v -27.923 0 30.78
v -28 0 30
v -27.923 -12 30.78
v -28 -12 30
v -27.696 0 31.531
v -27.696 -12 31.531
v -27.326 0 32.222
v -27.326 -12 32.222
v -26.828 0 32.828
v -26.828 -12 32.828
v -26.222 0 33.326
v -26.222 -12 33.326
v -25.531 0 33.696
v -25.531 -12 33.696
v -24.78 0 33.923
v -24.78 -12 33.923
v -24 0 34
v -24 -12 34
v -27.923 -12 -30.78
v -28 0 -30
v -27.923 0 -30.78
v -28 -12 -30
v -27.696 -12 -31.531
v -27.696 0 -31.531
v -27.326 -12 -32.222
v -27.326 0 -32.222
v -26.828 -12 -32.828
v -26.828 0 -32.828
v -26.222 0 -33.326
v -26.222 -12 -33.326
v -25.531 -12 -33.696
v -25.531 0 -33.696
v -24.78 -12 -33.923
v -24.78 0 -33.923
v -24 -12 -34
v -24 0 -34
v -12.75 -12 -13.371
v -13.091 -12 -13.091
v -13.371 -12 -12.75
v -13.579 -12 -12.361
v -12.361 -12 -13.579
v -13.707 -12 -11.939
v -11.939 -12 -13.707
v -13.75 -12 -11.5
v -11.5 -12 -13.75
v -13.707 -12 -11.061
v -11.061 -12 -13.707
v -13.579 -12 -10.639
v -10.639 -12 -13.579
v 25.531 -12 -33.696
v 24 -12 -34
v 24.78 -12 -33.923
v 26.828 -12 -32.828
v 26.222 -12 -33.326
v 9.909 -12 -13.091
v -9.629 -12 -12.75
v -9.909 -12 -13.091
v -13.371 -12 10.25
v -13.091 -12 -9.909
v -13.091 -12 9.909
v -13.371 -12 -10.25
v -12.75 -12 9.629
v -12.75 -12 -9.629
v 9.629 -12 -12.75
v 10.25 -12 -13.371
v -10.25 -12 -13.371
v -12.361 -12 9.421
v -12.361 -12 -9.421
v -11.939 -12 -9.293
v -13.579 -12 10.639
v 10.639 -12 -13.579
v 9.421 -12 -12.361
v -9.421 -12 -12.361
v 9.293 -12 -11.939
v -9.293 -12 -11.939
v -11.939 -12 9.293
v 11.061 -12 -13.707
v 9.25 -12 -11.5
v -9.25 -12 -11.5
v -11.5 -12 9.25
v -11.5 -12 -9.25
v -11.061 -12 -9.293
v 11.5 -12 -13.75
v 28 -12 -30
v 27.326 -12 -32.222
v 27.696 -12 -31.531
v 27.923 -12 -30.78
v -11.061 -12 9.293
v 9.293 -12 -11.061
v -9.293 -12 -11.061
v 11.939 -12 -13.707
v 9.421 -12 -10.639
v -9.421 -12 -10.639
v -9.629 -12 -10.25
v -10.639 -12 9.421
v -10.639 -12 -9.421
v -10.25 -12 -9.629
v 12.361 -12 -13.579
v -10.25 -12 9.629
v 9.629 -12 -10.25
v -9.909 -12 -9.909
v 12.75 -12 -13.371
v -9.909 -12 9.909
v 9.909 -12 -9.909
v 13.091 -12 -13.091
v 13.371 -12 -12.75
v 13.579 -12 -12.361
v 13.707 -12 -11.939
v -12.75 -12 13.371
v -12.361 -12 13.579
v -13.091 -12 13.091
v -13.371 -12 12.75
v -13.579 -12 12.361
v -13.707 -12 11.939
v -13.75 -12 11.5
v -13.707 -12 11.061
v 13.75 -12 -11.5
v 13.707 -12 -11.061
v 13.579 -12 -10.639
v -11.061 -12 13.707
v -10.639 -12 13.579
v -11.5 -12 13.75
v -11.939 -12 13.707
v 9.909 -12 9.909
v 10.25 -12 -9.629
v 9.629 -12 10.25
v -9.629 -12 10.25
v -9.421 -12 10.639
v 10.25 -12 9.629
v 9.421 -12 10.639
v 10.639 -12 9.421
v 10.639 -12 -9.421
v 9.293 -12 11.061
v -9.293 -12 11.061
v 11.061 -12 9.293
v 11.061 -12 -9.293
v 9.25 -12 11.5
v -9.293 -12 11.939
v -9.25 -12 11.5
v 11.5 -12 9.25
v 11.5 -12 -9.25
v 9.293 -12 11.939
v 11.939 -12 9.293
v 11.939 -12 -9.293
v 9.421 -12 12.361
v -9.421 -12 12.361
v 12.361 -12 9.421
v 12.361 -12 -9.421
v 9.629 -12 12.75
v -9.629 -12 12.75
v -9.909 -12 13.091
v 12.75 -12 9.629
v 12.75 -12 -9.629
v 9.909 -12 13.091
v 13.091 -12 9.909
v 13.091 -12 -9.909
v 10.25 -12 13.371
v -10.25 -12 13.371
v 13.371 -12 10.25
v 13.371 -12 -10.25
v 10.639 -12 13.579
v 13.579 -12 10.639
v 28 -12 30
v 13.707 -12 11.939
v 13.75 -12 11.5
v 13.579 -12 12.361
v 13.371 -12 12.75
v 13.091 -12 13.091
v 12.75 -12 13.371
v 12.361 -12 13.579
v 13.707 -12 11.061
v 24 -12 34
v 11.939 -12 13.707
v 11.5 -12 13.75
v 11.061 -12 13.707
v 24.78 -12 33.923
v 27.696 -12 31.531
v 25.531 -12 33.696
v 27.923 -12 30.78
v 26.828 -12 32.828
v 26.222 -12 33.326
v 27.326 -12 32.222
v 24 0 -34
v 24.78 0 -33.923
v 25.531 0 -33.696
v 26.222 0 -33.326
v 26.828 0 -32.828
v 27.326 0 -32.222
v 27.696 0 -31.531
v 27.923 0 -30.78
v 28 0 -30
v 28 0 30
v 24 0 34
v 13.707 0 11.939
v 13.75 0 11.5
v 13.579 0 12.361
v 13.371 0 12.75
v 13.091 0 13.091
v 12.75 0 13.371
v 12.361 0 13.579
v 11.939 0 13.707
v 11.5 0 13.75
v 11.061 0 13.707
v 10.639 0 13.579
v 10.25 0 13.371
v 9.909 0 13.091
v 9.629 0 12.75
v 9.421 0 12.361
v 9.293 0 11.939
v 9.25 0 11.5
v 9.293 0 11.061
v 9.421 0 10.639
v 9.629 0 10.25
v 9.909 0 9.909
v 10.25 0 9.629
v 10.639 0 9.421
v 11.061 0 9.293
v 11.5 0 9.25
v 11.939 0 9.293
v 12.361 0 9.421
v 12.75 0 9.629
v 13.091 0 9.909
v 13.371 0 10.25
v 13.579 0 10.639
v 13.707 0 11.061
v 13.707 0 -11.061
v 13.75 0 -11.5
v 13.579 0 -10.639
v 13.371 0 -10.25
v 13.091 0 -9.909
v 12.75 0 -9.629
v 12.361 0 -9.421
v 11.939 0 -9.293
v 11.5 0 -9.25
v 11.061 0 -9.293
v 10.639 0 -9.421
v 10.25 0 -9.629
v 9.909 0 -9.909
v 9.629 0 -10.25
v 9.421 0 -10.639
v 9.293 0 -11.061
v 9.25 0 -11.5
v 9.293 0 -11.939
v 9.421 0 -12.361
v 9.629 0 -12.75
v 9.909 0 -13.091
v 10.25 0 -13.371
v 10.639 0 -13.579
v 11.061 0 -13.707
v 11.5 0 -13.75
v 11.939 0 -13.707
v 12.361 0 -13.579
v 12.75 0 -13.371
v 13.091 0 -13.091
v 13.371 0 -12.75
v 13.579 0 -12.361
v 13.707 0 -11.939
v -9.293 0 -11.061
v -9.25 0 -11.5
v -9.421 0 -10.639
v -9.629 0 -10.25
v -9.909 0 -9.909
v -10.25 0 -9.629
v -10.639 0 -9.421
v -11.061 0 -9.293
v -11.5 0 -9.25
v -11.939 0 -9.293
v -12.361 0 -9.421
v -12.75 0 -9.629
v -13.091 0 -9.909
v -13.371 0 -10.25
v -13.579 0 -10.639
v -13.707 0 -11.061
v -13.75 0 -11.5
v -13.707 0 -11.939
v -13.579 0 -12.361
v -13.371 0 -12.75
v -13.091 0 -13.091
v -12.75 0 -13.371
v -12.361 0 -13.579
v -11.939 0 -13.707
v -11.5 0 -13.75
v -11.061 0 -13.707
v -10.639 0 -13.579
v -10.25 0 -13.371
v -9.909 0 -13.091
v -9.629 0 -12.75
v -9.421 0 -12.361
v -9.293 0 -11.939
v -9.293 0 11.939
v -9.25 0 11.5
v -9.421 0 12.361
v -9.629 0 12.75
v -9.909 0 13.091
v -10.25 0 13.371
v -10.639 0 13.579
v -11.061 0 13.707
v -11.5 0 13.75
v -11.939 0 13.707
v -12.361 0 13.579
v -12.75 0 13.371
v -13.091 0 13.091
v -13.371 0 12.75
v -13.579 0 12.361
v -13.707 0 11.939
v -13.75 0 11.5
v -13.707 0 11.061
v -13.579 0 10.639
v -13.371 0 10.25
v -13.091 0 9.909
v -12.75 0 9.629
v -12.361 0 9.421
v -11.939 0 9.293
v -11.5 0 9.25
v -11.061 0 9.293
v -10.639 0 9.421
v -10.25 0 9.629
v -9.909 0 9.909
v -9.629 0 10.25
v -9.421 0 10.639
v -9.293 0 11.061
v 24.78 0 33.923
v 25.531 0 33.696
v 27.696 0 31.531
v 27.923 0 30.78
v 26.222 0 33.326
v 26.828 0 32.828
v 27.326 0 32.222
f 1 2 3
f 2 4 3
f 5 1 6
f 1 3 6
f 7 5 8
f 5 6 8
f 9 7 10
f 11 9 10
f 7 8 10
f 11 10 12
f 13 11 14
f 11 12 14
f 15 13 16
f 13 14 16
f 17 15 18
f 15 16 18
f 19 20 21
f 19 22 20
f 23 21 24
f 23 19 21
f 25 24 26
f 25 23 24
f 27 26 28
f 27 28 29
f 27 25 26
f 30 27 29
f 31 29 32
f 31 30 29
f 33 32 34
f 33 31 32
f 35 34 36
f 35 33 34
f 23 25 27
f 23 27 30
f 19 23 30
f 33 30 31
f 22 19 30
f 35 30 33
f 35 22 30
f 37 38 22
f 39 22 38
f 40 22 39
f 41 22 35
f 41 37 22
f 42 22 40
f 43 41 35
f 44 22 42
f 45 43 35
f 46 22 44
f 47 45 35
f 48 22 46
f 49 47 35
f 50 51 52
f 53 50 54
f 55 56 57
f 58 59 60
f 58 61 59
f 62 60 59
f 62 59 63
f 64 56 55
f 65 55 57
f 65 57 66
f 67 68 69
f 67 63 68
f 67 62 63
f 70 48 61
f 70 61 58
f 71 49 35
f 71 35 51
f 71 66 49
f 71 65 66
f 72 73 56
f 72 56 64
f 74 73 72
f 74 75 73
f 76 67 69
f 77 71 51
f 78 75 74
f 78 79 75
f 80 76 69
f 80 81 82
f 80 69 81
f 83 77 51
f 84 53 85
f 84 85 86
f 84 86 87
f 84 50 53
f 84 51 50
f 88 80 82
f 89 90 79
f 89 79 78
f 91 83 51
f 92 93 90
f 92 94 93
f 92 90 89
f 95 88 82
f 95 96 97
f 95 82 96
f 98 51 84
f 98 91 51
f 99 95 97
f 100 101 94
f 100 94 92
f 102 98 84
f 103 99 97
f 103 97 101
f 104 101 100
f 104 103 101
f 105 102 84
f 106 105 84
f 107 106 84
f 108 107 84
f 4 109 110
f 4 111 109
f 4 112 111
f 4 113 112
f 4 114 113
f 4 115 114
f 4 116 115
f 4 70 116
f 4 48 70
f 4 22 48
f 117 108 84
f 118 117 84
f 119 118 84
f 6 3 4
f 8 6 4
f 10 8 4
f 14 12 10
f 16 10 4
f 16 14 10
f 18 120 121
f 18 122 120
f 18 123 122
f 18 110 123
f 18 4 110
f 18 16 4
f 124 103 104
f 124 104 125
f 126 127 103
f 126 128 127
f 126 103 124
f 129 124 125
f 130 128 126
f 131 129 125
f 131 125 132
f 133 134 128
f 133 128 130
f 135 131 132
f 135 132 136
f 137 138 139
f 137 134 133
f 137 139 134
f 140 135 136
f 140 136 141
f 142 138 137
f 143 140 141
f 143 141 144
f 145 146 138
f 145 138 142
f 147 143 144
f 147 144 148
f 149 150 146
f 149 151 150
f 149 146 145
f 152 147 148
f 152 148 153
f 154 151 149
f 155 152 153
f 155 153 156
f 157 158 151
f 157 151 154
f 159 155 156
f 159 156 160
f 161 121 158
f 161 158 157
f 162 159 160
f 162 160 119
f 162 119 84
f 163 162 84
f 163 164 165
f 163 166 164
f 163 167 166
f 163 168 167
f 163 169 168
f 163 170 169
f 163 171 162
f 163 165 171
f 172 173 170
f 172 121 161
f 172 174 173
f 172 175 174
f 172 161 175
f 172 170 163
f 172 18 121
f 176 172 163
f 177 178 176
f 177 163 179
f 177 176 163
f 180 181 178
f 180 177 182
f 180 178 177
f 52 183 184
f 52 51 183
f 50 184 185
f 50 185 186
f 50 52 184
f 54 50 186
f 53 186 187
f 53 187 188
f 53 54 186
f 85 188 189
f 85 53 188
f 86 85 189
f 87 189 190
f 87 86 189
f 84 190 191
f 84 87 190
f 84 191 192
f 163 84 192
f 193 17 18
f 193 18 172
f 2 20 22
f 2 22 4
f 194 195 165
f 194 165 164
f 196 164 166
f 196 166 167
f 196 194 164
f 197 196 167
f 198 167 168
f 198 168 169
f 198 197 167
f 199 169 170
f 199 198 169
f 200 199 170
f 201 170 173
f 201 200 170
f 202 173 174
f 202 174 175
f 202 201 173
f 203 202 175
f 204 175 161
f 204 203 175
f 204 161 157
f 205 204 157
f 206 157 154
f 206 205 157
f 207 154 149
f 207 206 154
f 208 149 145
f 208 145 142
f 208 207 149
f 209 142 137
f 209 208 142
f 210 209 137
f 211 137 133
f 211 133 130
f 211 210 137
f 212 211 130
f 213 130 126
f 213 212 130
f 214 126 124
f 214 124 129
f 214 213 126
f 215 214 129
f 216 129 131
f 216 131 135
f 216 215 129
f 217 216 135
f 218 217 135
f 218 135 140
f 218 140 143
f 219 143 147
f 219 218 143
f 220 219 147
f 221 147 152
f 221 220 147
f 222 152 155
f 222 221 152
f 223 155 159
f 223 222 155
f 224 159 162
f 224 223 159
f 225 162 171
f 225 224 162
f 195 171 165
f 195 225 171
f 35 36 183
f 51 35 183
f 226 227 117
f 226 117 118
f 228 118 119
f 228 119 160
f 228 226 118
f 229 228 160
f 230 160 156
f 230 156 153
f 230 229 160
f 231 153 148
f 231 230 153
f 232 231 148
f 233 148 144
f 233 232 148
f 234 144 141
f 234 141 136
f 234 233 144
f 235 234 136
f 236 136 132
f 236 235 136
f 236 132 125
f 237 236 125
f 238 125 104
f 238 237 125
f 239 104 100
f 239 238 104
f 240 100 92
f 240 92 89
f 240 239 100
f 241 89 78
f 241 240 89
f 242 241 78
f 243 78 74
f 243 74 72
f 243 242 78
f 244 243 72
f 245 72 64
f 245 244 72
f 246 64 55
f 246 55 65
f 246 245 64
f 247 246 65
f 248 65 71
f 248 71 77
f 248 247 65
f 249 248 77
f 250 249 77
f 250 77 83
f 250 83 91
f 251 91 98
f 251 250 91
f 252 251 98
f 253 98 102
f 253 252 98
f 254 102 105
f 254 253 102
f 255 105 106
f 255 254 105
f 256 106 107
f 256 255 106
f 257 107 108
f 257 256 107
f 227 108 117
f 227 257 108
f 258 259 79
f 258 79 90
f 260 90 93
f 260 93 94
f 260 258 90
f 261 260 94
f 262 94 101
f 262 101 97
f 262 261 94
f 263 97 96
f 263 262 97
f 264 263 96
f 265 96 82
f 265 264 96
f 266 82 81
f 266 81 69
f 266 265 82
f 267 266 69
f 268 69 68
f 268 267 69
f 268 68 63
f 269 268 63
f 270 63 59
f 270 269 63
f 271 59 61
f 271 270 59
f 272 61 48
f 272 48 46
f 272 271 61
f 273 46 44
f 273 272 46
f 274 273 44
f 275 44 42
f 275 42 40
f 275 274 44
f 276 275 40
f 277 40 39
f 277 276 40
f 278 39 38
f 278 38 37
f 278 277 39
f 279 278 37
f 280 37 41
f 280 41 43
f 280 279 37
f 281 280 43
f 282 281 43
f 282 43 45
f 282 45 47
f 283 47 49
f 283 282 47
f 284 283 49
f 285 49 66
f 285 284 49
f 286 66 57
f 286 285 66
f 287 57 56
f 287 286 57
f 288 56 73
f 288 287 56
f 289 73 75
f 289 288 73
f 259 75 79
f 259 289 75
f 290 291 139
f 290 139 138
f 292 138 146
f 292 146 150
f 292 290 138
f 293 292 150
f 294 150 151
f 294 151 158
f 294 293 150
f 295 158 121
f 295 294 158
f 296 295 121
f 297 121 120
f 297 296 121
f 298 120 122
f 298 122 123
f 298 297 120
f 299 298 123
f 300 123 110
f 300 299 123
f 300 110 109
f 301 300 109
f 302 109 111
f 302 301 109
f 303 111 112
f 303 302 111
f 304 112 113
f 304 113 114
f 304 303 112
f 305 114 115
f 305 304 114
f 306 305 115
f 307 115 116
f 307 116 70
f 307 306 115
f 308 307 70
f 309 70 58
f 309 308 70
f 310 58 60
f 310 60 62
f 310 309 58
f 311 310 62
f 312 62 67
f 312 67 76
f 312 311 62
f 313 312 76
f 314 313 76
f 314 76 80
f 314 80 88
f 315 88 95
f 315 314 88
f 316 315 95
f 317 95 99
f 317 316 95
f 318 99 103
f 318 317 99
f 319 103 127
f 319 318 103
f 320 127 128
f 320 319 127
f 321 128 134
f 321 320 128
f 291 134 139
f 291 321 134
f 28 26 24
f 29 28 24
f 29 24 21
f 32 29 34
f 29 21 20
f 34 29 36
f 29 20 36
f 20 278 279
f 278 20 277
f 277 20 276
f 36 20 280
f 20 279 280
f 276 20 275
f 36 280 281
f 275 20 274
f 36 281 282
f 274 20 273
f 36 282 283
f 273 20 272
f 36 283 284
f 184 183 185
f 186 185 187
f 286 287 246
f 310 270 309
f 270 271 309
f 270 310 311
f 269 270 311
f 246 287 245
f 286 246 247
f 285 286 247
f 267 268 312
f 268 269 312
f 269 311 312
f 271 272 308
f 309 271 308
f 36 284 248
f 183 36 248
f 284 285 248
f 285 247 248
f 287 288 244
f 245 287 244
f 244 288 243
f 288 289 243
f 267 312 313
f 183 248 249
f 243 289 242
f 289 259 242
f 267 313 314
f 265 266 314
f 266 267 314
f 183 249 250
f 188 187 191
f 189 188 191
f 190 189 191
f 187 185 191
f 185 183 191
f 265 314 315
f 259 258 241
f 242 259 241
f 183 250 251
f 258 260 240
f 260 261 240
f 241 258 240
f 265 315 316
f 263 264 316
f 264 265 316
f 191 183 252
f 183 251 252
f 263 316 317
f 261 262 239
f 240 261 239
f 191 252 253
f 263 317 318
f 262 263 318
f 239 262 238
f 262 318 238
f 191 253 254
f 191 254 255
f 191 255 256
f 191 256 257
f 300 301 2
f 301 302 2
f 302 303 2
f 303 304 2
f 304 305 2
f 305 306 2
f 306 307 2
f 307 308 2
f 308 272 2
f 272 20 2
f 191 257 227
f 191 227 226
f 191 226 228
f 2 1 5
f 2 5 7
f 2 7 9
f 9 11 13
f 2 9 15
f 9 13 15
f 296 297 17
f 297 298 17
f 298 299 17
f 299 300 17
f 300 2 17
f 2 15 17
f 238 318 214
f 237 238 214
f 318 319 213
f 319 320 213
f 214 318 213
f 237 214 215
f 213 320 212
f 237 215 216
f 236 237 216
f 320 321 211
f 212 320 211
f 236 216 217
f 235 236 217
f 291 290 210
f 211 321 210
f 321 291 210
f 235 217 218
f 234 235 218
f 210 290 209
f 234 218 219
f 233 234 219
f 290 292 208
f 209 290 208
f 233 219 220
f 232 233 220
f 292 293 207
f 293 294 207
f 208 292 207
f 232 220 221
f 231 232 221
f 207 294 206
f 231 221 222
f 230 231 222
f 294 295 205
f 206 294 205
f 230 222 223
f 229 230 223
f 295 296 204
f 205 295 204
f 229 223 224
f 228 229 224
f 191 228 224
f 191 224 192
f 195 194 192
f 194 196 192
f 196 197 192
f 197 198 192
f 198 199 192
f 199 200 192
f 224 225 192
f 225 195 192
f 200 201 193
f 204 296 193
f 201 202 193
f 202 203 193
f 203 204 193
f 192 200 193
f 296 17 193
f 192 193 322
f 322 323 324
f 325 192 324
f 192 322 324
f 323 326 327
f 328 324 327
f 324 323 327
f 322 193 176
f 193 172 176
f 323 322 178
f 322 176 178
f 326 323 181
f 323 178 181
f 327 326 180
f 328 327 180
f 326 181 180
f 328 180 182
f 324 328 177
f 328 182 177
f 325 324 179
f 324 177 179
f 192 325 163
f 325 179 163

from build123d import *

# Parameters (mm, degrees)
F0_W     = 56
F0_H     = 68
F0_R     = 2.25
F1_DEPTH = 12
F2_R     = 4


with BuildPart() as f1:
    # F0 (on Front) → F1 (new body)
    with BuildSketch(Plane.XZ):
        Rectangle(F0_W, F0_H)
        with Locations((-11.5, -11.5)):
            Circle(F0_R, mode=Mode.SUBTRACT)
        with Locations((11.5, -11.5)):
            Circle(F0_R, mode=Mode.SUBTRACT)
        with Locations((-11.5, 11.5)):
            Circle(F0_R, mode=Mode.SUBTRACT)
        with Locations((11.5, 11.5)):
            Circle(F0_R, mode=Mode.SUBTRACT)
    extrude(amount=F1_DEPTH)

    # F2
    f2_edges = [f1.edges().sort_by_distance(p)[0] for p in [
        (28, -6, -34),
        (-28, -6, -34),
        (28, -6, 34),
        (-28, -6, 34),
    ]]
    fillet(f2_edges, radius=F2_R)


solid = f1.part
